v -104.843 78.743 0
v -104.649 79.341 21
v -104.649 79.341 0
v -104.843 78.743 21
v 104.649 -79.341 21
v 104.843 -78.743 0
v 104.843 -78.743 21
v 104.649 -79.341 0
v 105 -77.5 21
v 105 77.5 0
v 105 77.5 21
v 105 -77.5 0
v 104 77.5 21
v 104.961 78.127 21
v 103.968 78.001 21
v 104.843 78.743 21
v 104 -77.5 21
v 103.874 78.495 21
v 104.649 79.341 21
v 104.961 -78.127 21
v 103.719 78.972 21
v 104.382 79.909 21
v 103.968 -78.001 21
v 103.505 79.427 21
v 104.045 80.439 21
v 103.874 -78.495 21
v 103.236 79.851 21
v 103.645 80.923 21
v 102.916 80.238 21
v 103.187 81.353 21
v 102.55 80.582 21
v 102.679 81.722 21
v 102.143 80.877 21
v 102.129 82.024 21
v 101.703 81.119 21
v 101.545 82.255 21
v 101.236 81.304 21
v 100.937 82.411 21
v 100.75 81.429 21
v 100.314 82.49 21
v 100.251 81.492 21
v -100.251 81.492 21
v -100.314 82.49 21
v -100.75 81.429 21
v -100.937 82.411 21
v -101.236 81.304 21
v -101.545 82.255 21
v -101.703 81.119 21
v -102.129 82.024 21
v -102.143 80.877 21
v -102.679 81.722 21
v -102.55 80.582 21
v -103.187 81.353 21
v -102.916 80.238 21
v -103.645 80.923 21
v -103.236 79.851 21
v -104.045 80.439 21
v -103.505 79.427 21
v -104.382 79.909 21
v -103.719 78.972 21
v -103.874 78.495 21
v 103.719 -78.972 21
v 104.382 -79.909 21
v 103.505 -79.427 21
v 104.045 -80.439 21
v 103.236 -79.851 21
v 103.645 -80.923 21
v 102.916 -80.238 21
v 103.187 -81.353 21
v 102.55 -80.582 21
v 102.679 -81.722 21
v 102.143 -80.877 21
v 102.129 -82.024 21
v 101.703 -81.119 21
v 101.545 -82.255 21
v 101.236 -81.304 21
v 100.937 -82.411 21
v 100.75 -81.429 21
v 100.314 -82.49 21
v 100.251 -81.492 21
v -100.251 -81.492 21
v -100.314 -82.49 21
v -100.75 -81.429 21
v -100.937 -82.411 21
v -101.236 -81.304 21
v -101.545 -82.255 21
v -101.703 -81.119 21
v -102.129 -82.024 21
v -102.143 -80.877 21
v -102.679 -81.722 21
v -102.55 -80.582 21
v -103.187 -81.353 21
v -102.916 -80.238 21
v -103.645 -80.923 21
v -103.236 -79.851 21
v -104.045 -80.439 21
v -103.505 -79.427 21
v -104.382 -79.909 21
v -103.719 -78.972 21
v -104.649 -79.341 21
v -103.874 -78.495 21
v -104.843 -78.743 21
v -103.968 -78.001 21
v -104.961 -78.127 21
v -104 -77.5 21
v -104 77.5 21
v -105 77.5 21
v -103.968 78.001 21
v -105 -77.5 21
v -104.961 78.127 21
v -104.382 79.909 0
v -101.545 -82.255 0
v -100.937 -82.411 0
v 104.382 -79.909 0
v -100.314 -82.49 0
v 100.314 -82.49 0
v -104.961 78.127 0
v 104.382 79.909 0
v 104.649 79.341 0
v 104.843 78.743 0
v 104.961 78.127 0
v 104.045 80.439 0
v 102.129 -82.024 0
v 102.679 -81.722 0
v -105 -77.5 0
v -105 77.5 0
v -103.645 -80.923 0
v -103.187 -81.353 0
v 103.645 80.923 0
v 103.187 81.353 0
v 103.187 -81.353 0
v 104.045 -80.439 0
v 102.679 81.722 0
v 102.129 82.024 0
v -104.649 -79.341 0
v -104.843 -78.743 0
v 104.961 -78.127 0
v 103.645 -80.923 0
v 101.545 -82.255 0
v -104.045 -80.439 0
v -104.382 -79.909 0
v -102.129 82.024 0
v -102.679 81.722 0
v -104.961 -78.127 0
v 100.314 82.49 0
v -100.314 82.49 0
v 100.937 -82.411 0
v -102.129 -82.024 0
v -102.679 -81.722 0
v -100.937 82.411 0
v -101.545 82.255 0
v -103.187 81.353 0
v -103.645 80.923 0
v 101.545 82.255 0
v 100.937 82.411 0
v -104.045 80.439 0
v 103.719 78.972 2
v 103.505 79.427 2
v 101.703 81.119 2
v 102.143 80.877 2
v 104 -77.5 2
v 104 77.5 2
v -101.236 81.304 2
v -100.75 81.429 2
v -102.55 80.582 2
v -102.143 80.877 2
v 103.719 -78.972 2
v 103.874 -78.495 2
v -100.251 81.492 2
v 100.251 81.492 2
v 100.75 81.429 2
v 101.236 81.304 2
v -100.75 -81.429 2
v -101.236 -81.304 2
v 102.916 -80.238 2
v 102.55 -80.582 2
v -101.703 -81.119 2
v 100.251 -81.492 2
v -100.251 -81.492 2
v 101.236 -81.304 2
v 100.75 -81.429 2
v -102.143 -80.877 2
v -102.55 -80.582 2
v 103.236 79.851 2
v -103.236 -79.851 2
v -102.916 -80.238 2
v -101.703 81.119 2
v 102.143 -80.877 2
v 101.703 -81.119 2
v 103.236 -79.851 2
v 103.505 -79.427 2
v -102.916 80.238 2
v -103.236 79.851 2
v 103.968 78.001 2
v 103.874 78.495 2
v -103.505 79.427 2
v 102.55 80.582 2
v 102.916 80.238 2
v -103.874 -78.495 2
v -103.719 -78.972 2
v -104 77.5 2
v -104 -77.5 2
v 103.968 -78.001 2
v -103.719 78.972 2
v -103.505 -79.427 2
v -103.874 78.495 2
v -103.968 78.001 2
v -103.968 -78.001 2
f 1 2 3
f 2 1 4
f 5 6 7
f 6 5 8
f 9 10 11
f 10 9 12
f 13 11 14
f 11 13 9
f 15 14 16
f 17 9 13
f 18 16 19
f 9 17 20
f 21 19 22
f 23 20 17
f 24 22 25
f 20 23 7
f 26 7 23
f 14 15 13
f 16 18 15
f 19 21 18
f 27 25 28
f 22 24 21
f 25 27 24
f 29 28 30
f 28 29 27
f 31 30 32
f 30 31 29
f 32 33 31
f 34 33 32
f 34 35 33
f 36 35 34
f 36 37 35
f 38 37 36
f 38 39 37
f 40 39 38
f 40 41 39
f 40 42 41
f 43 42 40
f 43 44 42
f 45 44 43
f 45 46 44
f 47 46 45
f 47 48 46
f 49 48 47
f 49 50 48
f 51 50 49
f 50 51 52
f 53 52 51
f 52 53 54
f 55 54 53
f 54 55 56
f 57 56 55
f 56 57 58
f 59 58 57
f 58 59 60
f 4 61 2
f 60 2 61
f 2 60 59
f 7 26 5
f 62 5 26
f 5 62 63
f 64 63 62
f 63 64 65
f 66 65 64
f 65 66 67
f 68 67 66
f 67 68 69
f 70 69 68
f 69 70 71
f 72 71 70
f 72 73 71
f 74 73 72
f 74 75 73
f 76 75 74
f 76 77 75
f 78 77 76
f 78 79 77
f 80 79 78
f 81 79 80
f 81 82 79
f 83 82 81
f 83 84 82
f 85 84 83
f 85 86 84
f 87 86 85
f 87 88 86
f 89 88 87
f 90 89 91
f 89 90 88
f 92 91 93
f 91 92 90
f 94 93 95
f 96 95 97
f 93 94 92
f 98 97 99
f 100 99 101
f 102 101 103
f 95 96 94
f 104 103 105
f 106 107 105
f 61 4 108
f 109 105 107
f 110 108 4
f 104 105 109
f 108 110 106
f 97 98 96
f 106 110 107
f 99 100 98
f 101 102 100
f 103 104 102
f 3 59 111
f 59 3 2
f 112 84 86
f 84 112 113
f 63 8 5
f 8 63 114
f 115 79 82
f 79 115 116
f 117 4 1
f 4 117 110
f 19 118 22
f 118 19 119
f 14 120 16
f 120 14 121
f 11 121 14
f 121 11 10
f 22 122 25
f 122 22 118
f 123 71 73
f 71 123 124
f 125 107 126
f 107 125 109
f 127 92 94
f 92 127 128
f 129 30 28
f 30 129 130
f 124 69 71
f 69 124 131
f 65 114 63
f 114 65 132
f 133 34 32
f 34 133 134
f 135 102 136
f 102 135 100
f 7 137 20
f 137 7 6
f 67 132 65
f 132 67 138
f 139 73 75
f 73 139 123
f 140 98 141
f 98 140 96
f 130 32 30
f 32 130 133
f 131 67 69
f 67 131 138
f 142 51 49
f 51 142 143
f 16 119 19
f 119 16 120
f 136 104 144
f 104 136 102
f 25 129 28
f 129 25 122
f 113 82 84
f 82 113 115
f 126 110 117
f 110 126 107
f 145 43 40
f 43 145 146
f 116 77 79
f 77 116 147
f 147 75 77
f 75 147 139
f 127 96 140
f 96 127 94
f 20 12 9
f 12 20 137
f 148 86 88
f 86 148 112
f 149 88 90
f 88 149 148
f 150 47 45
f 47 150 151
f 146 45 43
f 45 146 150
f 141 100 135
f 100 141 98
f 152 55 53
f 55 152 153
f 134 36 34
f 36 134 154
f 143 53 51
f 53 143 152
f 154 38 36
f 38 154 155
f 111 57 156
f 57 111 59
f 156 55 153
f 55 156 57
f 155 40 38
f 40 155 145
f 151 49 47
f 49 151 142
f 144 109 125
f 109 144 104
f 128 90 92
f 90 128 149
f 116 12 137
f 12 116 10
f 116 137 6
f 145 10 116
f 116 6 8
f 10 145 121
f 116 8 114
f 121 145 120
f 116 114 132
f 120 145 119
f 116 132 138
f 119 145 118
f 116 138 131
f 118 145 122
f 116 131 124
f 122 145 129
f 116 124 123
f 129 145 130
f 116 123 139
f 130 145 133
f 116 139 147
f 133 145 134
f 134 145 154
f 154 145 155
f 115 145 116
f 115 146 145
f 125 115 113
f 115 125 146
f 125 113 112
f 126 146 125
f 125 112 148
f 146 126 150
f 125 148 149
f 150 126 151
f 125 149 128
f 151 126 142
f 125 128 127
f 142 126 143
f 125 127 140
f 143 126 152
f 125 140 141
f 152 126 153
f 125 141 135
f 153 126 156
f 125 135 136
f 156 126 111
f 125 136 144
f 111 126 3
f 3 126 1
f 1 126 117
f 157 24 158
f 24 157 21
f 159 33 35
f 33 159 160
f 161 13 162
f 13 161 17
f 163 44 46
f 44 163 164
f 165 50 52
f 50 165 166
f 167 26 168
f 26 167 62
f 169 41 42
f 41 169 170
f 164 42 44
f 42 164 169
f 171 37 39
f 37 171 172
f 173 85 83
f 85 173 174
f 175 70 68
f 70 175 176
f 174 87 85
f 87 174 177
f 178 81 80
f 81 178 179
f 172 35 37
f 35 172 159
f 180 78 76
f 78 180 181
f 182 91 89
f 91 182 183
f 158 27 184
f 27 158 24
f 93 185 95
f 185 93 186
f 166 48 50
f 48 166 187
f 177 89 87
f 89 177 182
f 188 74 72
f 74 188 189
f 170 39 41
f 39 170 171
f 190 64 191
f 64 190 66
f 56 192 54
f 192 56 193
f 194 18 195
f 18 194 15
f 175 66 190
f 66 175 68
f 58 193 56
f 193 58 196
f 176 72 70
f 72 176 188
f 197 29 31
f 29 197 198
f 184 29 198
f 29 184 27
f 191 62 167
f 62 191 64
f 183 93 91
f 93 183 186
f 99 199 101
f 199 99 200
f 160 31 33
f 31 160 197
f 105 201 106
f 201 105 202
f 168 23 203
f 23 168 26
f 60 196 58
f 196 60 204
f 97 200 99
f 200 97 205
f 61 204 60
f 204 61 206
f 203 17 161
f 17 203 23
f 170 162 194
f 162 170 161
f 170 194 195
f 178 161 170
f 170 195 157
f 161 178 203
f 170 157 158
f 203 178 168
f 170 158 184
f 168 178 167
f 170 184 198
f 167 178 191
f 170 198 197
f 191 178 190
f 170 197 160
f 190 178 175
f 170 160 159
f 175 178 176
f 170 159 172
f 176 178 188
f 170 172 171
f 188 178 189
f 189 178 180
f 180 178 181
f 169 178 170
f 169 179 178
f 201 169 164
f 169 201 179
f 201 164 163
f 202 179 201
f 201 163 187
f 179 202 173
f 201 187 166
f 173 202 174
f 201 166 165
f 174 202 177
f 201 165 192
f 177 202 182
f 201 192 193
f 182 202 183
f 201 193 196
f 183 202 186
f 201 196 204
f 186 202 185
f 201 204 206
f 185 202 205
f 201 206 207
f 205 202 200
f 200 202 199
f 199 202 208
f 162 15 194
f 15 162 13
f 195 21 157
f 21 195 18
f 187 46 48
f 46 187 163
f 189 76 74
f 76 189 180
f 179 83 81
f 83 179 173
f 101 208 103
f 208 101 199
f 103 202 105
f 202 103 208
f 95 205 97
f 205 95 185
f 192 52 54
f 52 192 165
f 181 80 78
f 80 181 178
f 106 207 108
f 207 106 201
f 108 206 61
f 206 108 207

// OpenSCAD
$fn = 50;


difference() {
	union() {
		hull() {
			translate(v = [-100.0000000000, 77.5000000000, 0]) {
				cylinder(h = 21, r = 5);
			}
			translate(v = [100.0000000000, 77.5000000000, 0]) {
				cylinder(h = 21, r = 5);
			}
			translate(v = [-100.0000000000, -77.5000000000, 0]) {
				cylinder(h = 21, r = 5);
			}
			translate(v = [100.0000000000, -77.5000000000, 0]) {
				cylinder(h = 21, r = 5);
			}
		}
	}
	union() {
		translate(v = [0, 0, 2]) {
			hull() {
				translate(v = [-100.0000000000, 77.5000000000, 0]) {
					cylinder(h = 19, r = 4);
				}
				translate(v = [100.0000000000, 77.5000000000, 0]) {
					cylinder(h = 19, r = 4);
				}
				translate(v = [-100.0000000000, -77.5000000000, 0]) {
					cylinder(h = 19, r = 4);
				}
				translate(v = [100.0000000000, -77.5000000000, 0]) {
					cylinder(h = 19, r = 4);
				}
			}
		}
	}
}
